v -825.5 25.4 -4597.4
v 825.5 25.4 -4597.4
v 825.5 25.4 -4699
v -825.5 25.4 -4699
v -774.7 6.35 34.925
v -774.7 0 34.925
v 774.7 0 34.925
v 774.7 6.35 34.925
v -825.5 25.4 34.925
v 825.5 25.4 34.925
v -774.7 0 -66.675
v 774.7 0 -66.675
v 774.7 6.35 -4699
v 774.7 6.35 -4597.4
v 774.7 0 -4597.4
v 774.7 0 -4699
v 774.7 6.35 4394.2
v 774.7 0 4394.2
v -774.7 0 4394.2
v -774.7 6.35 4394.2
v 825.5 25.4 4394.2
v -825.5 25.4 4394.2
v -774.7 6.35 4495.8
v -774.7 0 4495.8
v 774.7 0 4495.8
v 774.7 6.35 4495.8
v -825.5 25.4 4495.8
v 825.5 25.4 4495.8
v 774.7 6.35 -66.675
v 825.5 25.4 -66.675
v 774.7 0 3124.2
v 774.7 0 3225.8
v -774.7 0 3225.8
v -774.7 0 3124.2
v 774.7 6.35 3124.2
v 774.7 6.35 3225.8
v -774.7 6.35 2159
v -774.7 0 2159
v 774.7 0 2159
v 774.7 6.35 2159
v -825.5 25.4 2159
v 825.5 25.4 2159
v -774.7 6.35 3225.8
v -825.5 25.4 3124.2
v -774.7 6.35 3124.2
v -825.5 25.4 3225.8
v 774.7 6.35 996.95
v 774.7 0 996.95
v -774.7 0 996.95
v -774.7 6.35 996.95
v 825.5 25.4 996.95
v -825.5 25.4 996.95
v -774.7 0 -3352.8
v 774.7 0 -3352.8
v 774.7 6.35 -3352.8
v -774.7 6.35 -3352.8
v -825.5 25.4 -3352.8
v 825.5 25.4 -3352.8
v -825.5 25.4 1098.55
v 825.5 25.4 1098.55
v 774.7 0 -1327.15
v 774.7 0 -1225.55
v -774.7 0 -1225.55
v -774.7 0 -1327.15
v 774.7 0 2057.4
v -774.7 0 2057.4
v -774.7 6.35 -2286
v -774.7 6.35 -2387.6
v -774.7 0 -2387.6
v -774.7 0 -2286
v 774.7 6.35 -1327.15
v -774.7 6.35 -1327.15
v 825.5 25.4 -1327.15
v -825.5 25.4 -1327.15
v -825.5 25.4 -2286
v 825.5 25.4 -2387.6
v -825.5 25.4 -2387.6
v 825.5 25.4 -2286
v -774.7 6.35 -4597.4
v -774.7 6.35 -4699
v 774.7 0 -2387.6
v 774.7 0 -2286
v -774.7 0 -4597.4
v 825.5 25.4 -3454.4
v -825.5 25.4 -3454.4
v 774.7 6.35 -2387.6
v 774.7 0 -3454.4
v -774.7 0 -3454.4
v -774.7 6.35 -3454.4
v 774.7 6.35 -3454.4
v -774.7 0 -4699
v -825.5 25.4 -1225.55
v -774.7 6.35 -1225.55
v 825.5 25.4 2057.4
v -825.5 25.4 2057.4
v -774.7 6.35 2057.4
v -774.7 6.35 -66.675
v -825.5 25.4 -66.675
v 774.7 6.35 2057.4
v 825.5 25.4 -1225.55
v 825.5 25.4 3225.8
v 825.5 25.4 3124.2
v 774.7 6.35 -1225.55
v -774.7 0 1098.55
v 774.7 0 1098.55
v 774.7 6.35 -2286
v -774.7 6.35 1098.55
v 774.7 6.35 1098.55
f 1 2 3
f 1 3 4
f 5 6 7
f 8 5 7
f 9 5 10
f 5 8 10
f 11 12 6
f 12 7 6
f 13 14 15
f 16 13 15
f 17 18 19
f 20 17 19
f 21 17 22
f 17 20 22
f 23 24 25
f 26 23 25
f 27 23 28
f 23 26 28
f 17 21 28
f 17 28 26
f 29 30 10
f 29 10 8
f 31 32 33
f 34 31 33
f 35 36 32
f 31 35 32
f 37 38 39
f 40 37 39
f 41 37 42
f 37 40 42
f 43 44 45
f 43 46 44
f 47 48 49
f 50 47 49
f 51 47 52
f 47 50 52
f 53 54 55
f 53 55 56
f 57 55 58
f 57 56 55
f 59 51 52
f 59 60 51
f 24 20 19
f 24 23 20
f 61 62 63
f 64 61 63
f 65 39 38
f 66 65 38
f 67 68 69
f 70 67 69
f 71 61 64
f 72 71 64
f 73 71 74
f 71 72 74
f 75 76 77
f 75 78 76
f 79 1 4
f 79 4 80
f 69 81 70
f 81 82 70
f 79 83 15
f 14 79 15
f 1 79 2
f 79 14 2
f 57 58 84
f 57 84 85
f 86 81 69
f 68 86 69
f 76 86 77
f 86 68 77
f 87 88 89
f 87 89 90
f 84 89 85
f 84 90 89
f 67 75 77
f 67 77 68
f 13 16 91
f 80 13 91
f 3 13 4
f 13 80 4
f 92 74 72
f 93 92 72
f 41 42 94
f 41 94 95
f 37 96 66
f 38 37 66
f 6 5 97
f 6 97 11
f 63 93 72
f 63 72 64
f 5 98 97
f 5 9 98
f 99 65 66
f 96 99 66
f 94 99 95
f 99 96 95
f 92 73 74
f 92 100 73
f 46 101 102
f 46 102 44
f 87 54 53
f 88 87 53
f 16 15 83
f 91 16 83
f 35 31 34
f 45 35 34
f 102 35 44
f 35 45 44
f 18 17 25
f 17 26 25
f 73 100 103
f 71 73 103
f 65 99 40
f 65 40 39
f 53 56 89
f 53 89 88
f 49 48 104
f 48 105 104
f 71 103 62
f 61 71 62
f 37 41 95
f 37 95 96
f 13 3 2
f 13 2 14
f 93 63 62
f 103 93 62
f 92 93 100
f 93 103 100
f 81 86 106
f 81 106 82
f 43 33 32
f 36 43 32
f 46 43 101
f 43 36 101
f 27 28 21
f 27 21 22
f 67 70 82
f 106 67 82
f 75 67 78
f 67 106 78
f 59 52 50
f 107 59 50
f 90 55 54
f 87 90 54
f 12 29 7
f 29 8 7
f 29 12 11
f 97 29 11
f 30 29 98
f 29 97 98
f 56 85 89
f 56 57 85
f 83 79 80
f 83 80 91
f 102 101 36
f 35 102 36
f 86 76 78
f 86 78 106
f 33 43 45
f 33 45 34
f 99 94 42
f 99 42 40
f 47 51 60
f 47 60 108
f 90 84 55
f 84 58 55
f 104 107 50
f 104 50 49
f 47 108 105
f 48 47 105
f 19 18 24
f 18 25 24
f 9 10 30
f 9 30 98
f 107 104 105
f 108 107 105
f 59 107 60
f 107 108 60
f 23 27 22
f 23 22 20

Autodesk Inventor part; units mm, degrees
ref_plane "YZ Plane" through (0, 0, 0) normal (1, 0, 0) x (0, 1, 0)
ref_plane "XZ Plane" through (0, 0, 0) normal (0, 1, 0) x (-1, 0, 0)
ref_plane "XY Plane" through (0, 0, 0) normal (0, 0, 1) x (1, 0, 0)
sketch "Sketch1" plane through (838.2, 0, 4876.8) normal (0, 1, 0) x (-1, 0, 0)
  line L0 (1676.4, 0) -> (1676.4, -9753.6)
  line L1 (0, 0) -> (0, -9753.6)
  line L2 (1676.4, -381) -> (0, -381)
  line L3 (0, -381) -> (0, -482.6)
  line L4 (0, -482.6) -> (1676.4, -482.6)
  line L5 (1676.4, -482.6) -> (1676.4, -381)
  line L6 (0, 0) -> (1676.4, 0)
  line L7 (1676.4, -1651) -> (0, -1651)
  line L8 (0, -1651) -> (0, -1752.6)
  line L9 (0, -1752.6) -> (1676.4, -1752.6)
  line L10 (1676.4, -1752.6) -> (1676.4, -1651)
  line L11 (1676.4, -2717.8) -> (0, -2717.8)
  line L12 (0, -2717.8) -> (0, -2819.4)
  line L13 (0, -2819.4) -> (1676.4, -2819.4)
  line L14 (1676.4, -2819.4) -> (1676.4, -2717.8)
  line L15 (1676.4, -3778.25) -> (0, -3778.25)
  line L16 (0, -3778.25) -> (0, -3879.85)
  line L17 (0, -3879.85) -> (1676.4, -3879.85)
  line L18 (1676.4, -3879.85) -> (1676.4, -3778.25)
  line L19 (1676.4, -4841.875) -> (0, -4841.875)
  line L20 (0, -4841.875) -> (0, -4943.475)
  line L21 (0, -4943.475) -> (1676.4, -4943.475)
  line L22 (1676.4, -4943.475) -> (1676.4, -4841.875)
  line L23 (1676.4, -6102.35) -> (0, -6102.35)
  line L24 (0, -6102.35) -> (0, -6203.95)
  line L25 (0, -6203.95) -> (1676.4, -6203.95)
  line L26 (1676.4, -6203.95) -> (1676.4, -6102.35)
  line L27 (1676.4, -7162.8) -> (0, -7162.8)
  line L28 (0, -7162.8) -> (0, -7264.4)
  line L29 (0, -7264.4) -> (1676.4, -7264.4)
  line L30 (1676.4, -7264.4) -> (1676.4, -7162.8)
  line L31 (1676.4, -8331.2) -> (0, -8331.2)
  line L32 (0, -8331.2) -> (0, -8229.6)
  line L33 (0, -8229.6) -> (1676.4, -8229.6)
  line L34 (1676.4, -8229.6) -> (1676.4, -8331.2)
  line L35 (1676.4, -9474.2) -> (0, -9474.2)
  line L36 (0, -9474.2) -> (0, -9575.8)
  line L37 (0, -9575.8) -> (1676.4, -9575.8)
  line L38 (1676.4, -9575.8) -> (1676.4, -9474.2)
  line L39 (1676.4, -9753.6) -> (0, -9753.6)
  point P0 (0, -9474.2)
  point P1 (0, -8331.2)
  point P2 (0, -7162.8)
  point P3 (0, -6102.35)
  point P4 (0, -4841.875)
  point P5 (0, -3778.25)
  point P6 (0, -2717.8)
  point P7 (0, -1651)
  point P8 (0, -381)
  dimension "d16" = 101.6
  dimension "d17" = 381
  dimension "d14" = 101.6
  dimension "d15" = 1168.4
  dimension "d12" = 101.6
  dimension "d10" = 101.6
  dimension "d13" = 965.2
  dimension "d11" = 958.85
  dimension "d8" = 101.6
  dimension "d9" = 962.025
  dimension "d7" = 1158.875
  dimension "d6" = 101.6
  dimension "d5" = 958.85
  dimension "d4" = 101.6
  dimension "d3" = 965.2
  dimension "d1" = 177.8
  dimension "d0" = 101.6
  dimension "d2" = 101.6
extrude "Extrusion1" add sketch "Sketch1" along normal blind 25.4 contours L0 L4 L1 L2 | L0 L9 L1 L7 | L0 L13 L1 L11 | L0 L17 L1 L15 | L0 L21 L1 L19 | L0 L25 L1 L23 | L0 L29 L1 L27 | L0 L31 L1 L33 | L0 L37 L1 L35
sketch "Sketch2" plane through (-838.2, 0, 4495.8) normal (0, 0, 1) x (1, 0, 0)
  line L0 (1676.4, 25.4) -> (0, 25.4) projected
  line L1 (1676.4, 25.4) -> (1663.7, 25.4)
  line L2 (1663.7, 25.4) -> (1612.9, 6.35)
  line L3 (1612.9, 6.35) -> (1612.9, 0)
  line L4 (1612.9, 0) -> (1676.4, 0)
  line L5 (1676.4, 0) -> (1676.4, 25.4)
  line L6 (0, 0) -> (1676.4, 0) projected
  line L7 (838.2, 25.4) -> (838.2, 0) construction
  line L8 (0, 25.4) -> (1676.4, 25.4)
  line L9 (0, 25.4) -> (12.7, 25.4)
  line L10 (12.7, 25.4) -> (63.5, 6.35)
  line L11 (63.5, 6.35) -> (63.5, 0)
  line L12 (63.5, 0) -> (0, 0)
  line L13 (0, 0) -> (0, 25.4)
  line L14 (1676.4, 0) -> (0, 0)
  point P0 (0, 25.4)
  point P1 (63.5, 0)
  dimension "d21" = 6.35
  dimension "d22" = 0
  dimension "d23" = 50.8
  dimension "d24" = 12.7
extrude "Extrusion2" cut sketch "Sketch2" against normal through all contours L5 L4 L3 L2 L0 | L10 L11 L6 L13 L0
properties part number "Cross Supports" material "Steel ASTM A36"
